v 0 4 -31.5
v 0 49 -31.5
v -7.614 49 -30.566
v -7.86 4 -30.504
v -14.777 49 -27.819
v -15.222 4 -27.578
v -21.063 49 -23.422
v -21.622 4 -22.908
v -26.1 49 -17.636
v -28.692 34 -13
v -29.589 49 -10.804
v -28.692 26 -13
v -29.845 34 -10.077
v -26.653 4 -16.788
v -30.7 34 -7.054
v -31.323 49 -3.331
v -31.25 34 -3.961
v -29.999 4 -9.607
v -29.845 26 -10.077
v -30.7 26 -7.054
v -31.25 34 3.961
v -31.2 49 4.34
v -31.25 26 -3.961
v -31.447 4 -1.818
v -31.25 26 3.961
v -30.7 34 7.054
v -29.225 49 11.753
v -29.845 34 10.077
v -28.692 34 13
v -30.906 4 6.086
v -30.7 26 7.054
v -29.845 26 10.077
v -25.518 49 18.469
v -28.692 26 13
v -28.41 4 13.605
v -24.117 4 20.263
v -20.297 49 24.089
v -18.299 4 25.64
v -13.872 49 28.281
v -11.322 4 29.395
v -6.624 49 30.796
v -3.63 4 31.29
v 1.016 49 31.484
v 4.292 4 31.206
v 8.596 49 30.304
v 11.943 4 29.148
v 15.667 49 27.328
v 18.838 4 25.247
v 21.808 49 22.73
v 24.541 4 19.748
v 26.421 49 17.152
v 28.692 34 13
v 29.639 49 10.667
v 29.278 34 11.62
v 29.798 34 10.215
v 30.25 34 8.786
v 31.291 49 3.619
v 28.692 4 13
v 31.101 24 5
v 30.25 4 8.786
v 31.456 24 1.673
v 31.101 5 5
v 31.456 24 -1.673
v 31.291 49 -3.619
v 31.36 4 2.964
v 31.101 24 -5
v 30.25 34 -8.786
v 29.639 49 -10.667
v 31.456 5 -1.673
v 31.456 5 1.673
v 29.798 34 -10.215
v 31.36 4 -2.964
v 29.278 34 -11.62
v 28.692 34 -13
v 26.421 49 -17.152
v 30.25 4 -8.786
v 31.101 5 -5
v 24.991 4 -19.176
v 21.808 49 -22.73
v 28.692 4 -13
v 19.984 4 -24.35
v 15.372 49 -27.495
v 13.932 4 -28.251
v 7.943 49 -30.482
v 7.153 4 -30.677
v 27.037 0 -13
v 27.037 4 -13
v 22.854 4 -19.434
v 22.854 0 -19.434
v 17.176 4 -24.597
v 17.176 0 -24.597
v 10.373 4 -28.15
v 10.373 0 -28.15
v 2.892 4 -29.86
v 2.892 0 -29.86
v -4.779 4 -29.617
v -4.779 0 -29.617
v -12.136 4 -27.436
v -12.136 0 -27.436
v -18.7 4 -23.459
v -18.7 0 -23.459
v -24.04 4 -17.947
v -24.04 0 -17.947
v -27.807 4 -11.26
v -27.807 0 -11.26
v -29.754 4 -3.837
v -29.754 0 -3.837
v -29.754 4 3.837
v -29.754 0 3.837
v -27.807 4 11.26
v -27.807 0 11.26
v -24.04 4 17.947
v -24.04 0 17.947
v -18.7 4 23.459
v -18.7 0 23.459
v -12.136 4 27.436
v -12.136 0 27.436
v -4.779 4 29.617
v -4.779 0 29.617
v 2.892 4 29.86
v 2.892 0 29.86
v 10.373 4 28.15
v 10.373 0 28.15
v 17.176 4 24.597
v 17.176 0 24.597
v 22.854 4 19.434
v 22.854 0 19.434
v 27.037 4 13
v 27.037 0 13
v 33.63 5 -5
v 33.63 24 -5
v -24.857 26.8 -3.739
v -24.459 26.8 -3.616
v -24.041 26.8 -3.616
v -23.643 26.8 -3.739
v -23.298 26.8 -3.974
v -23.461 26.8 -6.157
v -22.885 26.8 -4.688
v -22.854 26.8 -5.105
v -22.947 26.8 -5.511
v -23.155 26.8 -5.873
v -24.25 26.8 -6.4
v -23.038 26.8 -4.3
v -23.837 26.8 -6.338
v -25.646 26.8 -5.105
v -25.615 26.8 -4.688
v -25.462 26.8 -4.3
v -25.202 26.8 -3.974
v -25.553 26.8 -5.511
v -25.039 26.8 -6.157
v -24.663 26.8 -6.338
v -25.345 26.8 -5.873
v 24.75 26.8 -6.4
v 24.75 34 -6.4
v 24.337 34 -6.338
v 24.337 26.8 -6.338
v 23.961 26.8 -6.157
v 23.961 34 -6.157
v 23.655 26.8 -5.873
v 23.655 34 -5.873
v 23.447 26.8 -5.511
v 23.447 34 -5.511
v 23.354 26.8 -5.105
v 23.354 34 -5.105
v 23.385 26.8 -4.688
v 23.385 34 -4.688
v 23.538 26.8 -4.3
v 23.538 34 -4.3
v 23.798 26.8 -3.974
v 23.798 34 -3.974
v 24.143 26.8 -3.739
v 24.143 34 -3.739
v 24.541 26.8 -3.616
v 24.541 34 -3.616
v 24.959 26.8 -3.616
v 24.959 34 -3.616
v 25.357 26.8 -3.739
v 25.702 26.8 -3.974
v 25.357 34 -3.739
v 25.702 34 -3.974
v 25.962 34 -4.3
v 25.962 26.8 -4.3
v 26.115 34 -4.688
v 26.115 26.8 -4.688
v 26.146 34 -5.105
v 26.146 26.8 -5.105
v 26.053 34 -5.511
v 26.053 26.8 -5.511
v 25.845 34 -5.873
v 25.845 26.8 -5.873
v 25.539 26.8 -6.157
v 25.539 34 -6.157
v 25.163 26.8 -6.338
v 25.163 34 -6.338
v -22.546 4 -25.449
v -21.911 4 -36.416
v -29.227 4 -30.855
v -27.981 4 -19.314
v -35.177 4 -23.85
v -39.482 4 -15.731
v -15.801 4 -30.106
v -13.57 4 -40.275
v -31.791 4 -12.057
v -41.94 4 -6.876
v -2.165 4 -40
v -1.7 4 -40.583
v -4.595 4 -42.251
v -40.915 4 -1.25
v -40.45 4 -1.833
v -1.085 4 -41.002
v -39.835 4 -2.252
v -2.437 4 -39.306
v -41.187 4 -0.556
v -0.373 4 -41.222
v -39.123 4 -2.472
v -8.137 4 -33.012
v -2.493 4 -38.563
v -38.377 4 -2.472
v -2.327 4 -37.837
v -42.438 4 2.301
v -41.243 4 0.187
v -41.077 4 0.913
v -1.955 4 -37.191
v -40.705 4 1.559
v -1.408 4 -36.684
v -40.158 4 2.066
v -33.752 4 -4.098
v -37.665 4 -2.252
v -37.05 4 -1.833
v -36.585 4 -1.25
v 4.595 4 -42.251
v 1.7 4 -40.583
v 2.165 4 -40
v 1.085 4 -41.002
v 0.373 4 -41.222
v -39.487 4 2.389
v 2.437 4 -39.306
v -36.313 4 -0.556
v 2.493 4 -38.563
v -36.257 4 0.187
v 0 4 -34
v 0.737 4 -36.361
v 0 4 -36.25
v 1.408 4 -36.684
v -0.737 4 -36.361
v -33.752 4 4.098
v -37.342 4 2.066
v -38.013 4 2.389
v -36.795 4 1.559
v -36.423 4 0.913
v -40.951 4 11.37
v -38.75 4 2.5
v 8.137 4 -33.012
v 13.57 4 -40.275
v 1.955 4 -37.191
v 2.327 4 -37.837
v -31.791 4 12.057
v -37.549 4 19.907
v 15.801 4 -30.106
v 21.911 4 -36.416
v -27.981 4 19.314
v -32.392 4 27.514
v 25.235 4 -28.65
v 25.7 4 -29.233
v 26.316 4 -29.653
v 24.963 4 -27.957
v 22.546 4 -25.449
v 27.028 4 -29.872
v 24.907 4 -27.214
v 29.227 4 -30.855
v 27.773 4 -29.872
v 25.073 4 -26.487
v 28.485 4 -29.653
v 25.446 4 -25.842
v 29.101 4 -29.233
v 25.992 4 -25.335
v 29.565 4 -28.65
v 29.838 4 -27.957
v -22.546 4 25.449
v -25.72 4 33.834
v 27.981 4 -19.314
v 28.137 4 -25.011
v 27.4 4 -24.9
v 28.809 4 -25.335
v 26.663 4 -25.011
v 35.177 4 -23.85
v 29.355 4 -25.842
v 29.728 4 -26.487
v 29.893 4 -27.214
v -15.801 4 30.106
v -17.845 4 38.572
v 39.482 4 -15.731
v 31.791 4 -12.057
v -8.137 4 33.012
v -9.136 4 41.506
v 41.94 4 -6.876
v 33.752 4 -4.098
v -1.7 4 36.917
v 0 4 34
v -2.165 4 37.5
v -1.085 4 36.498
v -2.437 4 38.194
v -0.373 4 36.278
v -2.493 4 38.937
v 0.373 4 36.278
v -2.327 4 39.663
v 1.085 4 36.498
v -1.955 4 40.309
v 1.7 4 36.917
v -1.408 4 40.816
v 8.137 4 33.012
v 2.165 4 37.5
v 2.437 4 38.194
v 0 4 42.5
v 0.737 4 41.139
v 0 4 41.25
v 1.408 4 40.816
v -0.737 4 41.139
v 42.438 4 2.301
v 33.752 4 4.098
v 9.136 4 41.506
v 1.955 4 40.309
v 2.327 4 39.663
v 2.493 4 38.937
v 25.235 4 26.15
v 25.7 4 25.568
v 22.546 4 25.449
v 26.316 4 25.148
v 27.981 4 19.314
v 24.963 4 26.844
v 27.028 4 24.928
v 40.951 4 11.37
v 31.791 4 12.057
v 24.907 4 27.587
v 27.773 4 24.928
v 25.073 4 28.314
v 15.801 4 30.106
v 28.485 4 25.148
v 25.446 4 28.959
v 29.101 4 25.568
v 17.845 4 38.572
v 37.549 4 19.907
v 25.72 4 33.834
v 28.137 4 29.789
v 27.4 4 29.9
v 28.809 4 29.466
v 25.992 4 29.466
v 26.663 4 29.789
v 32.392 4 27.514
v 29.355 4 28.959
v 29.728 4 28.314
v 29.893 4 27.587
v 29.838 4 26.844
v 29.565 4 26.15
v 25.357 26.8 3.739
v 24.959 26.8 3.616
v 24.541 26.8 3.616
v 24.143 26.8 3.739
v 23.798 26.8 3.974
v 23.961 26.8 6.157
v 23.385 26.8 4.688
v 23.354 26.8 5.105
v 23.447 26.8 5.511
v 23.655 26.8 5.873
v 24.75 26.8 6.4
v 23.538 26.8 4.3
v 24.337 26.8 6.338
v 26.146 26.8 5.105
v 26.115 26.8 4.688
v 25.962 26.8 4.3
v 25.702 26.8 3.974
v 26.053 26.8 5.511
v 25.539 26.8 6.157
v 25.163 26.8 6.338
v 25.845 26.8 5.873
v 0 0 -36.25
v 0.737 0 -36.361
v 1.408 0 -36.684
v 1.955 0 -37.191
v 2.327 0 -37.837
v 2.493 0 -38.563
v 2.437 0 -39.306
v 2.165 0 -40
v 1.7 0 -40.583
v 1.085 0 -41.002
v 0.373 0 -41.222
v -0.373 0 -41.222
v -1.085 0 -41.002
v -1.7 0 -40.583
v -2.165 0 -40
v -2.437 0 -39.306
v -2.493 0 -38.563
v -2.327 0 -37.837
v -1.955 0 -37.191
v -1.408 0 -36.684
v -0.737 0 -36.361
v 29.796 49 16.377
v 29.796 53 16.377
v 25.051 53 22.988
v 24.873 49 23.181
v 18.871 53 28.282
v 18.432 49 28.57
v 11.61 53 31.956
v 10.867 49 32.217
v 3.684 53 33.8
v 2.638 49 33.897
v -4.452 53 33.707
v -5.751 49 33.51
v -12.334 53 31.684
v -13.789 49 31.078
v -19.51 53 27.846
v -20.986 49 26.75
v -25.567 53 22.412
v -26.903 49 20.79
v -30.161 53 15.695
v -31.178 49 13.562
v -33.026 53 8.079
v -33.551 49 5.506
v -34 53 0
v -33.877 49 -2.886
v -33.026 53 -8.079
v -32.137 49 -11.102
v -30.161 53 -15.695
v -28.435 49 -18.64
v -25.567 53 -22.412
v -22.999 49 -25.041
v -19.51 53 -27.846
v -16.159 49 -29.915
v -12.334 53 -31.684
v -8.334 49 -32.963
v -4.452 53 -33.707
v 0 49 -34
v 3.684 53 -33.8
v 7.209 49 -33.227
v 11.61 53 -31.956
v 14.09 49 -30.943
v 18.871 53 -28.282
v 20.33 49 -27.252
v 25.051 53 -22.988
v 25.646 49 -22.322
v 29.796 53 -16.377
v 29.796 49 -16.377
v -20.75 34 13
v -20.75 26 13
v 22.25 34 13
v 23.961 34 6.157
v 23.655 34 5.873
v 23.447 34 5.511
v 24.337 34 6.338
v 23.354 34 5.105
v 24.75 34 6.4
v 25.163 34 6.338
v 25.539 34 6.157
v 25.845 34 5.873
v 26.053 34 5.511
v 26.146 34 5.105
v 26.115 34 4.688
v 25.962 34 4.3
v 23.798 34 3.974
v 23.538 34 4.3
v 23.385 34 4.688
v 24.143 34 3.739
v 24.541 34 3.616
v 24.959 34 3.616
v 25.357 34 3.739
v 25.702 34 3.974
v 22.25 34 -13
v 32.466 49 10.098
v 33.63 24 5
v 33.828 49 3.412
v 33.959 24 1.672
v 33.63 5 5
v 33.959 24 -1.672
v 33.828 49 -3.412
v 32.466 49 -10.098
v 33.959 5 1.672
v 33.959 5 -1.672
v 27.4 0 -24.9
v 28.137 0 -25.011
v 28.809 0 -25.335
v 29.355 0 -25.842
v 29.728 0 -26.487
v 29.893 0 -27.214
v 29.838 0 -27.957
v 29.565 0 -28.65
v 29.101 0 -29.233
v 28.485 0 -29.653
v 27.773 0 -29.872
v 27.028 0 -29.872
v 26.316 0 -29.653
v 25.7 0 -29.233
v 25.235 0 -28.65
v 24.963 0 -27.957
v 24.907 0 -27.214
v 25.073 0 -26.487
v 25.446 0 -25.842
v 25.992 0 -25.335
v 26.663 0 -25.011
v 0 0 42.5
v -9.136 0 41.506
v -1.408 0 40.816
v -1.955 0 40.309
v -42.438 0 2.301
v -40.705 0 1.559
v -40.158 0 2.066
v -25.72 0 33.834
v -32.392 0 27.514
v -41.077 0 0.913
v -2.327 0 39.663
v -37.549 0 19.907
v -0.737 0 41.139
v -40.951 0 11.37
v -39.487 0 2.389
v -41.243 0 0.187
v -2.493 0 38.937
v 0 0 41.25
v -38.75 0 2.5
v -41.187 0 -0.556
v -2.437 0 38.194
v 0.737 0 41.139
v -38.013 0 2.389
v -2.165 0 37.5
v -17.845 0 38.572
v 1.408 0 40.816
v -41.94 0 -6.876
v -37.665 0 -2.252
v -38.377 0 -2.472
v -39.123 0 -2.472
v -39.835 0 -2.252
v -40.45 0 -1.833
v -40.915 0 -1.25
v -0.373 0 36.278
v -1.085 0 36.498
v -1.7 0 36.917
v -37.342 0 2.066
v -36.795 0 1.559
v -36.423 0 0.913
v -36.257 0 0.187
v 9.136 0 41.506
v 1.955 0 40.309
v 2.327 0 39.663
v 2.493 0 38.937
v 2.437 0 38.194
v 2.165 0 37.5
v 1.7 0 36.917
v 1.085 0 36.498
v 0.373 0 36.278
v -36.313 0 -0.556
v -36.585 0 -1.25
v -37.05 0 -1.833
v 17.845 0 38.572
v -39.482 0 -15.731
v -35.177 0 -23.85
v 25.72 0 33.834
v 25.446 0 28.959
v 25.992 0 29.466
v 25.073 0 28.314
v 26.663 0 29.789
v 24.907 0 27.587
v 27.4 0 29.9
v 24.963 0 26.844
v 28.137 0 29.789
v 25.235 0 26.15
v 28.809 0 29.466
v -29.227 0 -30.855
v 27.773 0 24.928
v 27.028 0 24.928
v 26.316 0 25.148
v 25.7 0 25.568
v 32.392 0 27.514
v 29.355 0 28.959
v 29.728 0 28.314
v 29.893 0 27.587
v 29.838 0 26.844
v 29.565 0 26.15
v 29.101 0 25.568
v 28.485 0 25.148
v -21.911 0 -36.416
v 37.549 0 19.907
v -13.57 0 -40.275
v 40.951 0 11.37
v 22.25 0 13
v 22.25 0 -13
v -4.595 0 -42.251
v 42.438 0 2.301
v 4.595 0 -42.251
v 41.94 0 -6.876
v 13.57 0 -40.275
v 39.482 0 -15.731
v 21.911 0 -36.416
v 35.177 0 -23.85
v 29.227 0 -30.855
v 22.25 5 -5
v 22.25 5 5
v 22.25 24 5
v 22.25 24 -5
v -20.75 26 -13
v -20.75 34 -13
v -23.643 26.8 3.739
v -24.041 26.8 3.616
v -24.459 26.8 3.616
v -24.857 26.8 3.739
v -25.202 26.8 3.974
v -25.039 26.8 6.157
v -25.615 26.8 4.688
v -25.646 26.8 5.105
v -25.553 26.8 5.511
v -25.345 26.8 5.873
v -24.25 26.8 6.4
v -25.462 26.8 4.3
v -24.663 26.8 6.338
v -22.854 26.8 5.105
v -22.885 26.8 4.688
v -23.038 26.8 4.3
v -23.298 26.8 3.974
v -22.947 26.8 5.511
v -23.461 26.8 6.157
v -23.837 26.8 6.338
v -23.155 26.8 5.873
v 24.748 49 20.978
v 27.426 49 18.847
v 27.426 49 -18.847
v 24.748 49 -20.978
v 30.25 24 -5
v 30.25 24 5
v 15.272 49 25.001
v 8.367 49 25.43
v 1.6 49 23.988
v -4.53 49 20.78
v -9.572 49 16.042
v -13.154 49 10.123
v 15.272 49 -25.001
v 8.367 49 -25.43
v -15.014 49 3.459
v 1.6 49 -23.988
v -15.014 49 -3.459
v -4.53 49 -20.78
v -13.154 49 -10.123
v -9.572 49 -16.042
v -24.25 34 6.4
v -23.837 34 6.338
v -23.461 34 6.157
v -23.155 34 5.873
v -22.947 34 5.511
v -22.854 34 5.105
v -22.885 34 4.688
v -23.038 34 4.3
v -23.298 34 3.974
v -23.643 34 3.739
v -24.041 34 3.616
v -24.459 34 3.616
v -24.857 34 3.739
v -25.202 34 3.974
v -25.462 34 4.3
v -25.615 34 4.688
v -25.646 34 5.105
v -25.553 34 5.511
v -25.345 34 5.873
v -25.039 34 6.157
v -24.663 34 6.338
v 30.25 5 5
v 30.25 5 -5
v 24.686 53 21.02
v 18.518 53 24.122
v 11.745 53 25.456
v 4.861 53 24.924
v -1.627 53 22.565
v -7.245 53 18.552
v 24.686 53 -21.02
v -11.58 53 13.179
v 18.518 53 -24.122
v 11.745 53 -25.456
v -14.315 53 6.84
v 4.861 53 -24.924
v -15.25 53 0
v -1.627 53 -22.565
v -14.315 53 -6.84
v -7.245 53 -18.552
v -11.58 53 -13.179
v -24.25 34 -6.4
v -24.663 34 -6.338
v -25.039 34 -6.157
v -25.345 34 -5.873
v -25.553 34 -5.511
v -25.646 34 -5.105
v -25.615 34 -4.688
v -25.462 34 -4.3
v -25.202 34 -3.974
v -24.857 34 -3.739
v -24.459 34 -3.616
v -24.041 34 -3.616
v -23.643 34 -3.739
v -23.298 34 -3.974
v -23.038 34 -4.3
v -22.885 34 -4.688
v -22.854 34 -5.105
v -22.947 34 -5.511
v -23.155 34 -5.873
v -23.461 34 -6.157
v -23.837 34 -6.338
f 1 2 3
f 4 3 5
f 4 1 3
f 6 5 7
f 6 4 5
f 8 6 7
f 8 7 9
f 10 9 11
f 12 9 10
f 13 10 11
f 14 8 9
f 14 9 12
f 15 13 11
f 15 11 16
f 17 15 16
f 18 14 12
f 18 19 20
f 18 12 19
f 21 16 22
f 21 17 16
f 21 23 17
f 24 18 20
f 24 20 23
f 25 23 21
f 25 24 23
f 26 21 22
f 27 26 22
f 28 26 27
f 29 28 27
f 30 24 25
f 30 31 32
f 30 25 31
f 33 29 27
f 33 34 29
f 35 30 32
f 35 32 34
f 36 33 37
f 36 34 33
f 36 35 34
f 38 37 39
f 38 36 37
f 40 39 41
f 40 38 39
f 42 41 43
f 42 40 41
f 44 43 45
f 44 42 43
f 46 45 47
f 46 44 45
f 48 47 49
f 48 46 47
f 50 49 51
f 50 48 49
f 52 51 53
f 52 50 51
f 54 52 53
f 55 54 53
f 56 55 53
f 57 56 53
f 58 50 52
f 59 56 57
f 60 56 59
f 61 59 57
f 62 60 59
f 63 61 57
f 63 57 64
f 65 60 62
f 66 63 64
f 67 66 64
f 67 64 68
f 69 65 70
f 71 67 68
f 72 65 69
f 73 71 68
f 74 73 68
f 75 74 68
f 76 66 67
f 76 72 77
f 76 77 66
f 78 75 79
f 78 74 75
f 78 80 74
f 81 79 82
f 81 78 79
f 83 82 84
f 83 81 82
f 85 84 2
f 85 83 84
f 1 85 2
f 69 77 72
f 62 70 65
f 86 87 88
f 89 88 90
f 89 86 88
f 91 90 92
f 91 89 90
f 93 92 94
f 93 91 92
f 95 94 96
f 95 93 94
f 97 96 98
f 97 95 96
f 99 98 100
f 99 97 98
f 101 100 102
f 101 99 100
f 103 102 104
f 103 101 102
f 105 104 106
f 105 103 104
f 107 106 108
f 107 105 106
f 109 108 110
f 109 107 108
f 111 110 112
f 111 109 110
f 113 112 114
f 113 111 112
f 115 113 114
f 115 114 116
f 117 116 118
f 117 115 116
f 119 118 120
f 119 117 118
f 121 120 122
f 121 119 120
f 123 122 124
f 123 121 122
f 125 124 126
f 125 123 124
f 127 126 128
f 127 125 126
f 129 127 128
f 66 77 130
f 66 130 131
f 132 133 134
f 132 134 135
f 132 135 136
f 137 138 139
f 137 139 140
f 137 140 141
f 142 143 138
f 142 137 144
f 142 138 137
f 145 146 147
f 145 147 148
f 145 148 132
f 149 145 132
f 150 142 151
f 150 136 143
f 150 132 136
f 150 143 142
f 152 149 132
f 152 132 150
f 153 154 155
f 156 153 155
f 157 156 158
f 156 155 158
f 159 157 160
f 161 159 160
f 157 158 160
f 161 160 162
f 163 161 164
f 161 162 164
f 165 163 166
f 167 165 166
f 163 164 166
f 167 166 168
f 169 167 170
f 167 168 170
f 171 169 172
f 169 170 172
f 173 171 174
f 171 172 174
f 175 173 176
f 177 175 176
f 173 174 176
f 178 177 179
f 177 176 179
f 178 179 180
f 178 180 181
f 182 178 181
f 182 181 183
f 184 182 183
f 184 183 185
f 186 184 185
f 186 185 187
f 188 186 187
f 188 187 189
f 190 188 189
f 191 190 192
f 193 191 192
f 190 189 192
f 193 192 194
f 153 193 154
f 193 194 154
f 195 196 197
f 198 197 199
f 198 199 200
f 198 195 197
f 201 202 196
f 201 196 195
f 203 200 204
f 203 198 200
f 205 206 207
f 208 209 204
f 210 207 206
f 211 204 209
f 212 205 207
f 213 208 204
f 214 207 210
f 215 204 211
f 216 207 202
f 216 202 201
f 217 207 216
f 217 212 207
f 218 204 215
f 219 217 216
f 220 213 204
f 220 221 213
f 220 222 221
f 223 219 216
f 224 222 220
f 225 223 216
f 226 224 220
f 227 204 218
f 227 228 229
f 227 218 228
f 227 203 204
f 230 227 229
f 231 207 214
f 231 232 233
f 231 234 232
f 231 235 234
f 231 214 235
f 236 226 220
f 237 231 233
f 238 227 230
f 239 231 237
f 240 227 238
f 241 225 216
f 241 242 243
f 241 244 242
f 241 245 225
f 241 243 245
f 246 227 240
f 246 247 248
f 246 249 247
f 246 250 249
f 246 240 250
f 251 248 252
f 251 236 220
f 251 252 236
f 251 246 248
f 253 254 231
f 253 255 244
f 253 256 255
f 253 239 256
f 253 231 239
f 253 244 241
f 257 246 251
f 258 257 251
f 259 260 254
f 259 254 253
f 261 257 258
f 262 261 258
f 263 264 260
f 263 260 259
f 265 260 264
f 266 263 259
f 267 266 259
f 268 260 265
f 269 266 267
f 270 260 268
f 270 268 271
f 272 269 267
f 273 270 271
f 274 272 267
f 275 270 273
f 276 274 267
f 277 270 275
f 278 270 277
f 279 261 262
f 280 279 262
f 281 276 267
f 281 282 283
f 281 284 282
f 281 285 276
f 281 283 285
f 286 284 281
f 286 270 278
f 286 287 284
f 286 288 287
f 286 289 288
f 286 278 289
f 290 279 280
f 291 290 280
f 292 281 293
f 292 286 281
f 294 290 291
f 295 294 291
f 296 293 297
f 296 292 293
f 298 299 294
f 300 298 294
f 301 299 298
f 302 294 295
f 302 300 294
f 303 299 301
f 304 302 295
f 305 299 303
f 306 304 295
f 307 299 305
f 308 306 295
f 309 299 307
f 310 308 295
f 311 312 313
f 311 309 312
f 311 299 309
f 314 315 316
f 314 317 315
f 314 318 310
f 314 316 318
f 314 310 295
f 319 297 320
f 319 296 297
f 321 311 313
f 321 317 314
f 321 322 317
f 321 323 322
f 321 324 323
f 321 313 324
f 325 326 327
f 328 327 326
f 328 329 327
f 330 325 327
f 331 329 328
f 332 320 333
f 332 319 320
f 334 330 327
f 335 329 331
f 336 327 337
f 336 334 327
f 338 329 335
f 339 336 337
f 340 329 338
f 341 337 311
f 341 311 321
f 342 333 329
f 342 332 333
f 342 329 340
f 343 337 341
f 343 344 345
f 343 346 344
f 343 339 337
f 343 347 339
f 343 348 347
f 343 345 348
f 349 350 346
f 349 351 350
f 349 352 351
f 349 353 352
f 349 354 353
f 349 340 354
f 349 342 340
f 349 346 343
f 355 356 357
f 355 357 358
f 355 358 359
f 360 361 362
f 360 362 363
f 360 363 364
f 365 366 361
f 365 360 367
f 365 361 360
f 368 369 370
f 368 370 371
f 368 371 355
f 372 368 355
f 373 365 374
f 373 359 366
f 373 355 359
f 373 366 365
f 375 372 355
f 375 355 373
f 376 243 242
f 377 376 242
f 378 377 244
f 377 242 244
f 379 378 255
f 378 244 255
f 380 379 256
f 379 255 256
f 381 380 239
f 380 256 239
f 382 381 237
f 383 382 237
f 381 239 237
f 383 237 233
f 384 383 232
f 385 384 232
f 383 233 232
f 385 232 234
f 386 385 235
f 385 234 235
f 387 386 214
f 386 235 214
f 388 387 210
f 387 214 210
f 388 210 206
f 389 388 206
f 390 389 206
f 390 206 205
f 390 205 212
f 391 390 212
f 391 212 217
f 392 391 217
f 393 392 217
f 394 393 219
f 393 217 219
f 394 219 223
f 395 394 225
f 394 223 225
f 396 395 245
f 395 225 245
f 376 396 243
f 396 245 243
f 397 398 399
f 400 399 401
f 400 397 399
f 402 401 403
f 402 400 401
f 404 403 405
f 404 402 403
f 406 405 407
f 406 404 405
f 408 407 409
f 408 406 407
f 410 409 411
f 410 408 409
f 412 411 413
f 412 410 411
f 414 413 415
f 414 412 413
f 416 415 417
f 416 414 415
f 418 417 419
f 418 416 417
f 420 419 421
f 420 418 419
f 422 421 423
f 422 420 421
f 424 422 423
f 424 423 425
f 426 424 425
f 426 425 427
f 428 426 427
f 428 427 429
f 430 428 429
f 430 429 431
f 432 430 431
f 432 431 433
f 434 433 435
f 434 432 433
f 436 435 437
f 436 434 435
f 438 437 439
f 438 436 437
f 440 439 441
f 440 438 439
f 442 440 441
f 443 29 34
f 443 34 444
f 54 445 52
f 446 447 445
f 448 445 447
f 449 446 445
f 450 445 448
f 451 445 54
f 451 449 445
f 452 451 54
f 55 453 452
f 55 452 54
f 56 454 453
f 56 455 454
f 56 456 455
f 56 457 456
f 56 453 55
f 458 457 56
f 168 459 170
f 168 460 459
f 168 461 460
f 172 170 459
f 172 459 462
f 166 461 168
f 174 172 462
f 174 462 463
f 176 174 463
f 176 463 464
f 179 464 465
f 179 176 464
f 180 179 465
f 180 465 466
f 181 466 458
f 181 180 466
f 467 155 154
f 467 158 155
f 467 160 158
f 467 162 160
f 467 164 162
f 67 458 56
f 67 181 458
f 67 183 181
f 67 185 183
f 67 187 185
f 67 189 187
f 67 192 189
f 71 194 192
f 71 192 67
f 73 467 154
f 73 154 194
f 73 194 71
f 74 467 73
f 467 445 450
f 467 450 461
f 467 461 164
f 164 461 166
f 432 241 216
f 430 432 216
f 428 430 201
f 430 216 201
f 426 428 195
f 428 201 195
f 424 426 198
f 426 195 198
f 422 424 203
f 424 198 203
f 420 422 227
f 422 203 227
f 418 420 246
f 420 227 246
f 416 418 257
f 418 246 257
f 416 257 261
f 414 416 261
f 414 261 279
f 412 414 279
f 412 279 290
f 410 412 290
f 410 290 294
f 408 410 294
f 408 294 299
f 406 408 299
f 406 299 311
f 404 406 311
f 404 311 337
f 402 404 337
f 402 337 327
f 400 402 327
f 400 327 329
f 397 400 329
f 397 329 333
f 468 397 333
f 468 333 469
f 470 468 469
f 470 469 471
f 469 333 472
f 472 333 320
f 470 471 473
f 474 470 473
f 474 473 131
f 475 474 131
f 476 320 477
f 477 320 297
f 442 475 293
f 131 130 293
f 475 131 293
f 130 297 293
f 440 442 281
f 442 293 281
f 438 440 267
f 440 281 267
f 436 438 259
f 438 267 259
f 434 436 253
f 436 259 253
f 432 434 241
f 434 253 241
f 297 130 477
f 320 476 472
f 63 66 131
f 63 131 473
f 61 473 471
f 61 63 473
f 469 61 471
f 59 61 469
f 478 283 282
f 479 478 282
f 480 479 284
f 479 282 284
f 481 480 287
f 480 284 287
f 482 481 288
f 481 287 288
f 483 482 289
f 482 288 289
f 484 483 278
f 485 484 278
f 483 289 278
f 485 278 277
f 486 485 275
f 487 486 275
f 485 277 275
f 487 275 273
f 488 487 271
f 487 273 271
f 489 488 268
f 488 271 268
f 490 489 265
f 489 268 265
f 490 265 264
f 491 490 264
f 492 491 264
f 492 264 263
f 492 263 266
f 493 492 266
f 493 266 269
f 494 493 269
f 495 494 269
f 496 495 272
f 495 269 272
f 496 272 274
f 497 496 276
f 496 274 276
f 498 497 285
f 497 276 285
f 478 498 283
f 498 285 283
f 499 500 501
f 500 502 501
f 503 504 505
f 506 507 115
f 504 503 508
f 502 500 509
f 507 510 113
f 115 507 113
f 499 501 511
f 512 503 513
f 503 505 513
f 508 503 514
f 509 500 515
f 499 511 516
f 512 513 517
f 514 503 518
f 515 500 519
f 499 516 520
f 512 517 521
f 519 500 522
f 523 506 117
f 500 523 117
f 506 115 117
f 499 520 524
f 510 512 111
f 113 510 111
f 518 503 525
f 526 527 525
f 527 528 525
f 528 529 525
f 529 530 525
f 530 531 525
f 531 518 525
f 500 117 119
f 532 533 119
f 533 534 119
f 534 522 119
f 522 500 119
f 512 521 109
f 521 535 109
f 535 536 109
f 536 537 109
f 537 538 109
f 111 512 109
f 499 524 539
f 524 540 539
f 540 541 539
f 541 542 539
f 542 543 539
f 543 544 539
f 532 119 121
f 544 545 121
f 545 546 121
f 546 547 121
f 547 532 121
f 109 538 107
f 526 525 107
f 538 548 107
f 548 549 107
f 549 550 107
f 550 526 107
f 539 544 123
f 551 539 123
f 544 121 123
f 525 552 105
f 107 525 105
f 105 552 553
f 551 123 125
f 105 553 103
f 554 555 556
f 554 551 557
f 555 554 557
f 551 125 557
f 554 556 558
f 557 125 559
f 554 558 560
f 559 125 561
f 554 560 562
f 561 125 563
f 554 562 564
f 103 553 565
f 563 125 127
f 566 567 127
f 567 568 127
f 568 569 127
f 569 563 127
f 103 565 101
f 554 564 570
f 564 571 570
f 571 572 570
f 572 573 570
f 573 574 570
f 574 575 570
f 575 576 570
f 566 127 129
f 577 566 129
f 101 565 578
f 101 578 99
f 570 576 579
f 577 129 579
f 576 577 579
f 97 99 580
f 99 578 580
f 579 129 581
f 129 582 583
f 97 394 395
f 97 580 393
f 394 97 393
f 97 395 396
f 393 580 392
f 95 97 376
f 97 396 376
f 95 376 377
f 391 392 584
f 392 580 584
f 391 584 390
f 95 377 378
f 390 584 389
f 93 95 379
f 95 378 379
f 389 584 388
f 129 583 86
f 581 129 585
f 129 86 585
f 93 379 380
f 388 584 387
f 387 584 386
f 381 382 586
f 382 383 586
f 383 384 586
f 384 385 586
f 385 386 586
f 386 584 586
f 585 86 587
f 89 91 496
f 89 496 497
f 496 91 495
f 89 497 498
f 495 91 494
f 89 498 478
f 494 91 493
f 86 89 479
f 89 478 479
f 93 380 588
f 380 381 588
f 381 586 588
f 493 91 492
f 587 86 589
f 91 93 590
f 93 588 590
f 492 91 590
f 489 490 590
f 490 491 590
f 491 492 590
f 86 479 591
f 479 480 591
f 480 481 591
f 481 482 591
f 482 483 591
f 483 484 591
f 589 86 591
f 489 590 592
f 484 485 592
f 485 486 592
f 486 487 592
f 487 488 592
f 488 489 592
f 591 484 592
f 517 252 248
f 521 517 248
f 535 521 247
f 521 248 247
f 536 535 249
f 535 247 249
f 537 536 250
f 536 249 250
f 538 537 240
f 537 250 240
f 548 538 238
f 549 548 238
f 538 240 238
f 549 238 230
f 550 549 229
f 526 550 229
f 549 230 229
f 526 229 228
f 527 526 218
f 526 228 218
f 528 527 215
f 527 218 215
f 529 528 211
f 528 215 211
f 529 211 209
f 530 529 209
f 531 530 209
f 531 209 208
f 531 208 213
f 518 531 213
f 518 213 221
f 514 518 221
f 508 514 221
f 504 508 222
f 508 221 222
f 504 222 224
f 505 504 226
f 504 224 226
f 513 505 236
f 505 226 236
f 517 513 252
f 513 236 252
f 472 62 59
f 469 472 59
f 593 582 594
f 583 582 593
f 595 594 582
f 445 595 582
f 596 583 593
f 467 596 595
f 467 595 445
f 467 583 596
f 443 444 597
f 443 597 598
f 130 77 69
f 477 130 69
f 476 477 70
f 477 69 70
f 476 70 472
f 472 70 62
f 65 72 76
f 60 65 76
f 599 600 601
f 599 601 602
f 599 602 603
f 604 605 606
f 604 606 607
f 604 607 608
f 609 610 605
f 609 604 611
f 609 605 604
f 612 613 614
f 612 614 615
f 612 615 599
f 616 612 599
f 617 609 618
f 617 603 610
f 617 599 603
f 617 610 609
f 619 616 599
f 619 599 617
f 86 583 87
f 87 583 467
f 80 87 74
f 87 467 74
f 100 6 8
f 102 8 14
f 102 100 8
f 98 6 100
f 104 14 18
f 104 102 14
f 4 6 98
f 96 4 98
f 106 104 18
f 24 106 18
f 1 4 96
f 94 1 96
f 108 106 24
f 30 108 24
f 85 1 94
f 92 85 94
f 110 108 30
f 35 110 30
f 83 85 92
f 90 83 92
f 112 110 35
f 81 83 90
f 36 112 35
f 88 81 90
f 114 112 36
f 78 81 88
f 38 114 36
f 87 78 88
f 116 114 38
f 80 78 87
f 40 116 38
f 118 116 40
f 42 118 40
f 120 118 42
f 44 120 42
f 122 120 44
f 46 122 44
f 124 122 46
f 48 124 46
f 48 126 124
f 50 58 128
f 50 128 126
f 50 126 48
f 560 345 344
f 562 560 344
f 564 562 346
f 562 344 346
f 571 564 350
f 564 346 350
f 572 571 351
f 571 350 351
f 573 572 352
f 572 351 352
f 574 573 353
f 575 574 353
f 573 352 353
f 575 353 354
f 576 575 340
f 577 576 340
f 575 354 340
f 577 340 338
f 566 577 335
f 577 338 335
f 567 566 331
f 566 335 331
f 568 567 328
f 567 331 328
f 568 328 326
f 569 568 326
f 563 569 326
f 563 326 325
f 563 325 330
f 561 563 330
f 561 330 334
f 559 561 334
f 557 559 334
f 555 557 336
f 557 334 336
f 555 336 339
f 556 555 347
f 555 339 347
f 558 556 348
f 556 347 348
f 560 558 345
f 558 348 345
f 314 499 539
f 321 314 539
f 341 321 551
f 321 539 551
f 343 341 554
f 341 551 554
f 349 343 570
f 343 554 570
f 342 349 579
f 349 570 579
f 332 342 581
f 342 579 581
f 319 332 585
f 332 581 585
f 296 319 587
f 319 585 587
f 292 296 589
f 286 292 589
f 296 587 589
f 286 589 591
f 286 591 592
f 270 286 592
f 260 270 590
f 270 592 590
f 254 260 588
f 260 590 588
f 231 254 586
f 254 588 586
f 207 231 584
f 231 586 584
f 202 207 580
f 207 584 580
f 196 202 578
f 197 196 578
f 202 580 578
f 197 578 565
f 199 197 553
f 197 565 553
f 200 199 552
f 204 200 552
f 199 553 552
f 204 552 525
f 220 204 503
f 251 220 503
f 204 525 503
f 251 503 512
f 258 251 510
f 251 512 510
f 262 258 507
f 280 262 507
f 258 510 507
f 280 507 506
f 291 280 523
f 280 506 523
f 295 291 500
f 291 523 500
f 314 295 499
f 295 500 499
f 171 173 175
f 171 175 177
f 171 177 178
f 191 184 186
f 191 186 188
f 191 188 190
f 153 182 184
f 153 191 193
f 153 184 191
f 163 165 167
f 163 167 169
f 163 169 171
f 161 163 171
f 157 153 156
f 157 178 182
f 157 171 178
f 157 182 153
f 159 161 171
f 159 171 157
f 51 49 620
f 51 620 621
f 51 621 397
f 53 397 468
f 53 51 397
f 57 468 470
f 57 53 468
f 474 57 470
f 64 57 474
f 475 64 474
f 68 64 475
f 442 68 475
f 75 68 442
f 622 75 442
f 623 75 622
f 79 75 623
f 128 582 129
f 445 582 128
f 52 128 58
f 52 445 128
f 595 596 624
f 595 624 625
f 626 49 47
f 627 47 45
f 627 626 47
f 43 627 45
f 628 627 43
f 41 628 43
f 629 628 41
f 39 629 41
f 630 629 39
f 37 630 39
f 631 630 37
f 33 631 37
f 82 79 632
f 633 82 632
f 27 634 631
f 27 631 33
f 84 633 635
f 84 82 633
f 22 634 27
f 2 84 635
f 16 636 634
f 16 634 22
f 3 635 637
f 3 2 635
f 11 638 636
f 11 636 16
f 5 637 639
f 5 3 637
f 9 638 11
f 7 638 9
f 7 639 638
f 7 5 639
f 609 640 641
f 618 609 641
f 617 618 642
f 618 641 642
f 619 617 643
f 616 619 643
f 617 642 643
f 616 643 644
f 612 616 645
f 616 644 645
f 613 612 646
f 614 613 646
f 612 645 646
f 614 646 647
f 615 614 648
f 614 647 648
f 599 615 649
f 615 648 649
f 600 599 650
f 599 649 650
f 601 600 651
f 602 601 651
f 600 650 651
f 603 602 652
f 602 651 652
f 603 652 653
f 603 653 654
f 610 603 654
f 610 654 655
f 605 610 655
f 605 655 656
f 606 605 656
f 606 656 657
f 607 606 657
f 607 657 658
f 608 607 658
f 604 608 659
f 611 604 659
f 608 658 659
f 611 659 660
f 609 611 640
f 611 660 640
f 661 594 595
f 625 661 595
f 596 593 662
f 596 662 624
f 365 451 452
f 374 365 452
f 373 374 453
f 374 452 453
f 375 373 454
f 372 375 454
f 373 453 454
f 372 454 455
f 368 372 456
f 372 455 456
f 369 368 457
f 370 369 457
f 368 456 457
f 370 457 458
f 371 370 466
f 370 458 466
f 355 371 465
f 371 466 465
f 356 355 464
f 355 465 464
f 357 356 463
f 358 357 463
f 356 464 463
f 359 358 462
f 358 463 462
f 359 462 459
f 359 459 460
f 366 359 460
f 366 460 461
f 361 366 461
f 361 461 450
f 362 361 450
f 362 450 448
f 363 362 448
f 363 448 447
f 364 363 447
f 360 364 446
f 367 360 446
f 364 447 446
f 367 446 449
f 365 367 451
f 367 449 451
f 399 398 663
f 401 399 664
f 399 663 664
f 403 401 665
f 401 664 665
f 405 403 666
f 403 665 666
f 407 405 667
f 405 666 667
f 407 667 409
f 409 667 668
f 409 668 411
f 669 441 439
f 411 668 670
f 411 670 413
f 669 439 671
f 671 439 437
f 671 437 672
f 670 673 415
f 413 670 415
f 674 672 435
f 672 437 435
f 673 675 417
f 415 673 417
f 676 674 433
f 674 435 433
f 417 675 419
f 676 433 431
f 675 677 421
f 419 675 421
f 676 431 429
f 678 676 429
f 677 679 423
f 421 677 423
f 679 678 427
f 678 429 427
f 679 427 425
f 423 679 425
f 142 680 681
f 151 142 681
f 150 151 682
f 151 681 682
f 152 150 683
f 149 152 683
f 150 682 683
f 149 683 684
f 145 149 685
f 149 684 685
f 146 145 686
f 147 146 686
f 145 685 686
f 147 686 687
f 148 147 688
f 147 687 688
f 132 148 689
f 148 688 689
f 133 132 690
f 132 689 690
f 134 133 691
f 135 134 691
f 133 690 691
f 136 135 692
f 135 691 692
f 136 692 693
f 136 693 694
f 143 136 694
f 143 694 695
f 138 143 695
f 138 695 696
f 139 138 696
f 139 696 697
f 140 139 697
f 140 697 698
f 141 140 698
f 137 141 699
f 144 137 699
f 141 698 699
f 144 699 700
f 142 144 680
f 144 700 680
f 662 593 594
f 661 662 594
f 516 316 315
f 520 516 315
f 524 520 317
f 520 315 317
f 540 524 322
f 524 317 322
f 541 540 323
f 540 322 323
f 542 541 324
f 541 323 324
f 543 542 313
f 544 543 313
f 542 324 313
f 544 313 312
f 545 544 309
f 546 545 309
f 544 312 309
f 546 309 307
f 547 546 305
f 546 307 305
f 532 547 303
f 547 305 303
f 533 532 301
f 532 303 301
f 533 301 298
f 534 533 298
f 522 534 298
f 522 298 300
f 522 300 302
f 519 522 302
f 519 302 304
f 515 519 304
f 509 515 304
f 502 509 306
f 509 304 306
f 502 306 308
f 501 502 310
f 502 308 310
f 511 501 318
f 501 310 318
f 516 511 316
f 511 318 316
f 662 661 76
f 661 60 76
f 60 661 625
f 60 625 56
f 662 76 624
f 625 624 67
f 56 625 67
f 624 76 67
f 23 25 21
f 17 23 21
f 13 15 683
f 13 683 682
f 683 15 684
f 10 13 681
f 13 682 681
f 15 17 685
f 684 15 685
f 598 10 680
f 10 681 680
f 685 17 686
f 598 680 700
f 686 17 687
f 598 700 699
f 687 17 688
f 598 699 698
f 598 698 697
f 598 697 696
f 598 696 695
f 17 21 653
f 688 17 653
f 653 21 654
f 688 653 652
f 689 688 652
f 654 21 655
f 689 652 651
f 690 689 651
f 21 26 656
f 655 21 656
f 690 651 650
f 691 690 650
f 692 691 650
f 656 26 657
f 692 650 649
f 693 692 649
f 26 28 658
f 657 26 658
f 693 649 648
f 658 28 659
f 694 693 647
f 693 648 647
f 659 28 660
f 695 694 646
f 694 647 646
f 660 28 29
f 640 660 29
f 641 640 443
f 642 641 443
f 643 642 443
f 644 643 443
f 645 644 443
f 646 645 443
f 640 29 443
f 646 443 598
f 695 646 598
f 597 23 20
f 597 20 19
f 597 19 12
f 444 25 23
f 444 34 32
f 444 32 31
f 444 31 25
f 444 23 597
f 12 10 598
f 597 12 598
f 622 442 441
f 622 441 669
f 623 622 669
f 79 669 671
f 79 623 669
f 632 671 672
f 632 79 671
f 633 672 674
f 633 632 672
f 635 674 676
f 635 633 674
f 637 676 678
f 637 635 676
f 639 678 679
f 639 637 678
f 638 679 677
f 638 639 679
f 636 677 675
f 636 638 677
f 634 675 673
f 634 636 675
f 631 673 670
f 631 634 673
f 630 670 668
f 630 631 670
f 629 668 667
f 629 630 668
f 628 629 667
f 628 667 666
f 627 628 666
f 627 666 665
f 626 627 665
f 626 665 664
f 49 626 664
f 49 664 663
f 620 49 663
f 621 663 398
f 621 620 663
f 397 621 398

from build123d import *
from build123d.topology import SkipClean

# Parameters (mm, degrees)
SKETCH1_R           = 42.5
SKETCH1_R_2         = 30
BOSS_EXTRUDE1_DEPTH = 4
SKETCH2_R           = 34
SKETCH2_R_2         = 31.5
BOSS_EXTRUDE2_DEPTH = 45
SKETCH3_W           = 8
SKETCH3_H           = 34
SKETCH3_W_2         = 10.5
SKETCH3_H_2         = 8
BOSS_EXTRUDE3_DEPTH = 13
SKETCH4_W           = 10
SKETCH4_H           = 19
CUT_EXTRUDE1_DEPTH  = 92.650490997
SKETCH6_R           = 1.4
CUT_EXTRUDE3_DEPTH  = 7.2
SKETCH8_R           = 2.5
CUT_EXTRUDE4_DEPTH  = 4
BOSS_EXTRUDE4_DEPTH = 4


with BuildPart() as part:
    # Sketch1 → Boss-Extrude1 (new body)
    with BuildSketch(Plane(origin=(0, 0, 0), x_dir=(1, 0, 0), z_dir=(0, 1, 0))):
        with Locations(Location((0, 0, 0), (0, 0, 270))):
            Circle(SKETCH1_R)
        with Locations(Location((0, 0, 0), (0, 0, 270))):
            Circle(SKETCH1_R_2, mode=Mode.SUBTRACT)
    extrude(amount=BOSS_EXTRUDE1_DEPTH)

    # Sketch2 → Boss-Extrude2 (add)
    with BuildSketch(Plane(origin=(0, 4, 0), x_dir=(1, 0, 0), z_dir=(0, 1, 0))):
        with Locations(Location((0, 0, 0), (0, 0, 90))):
            Circle(SKETCH2_R)
        with Locations(Location((0, 0, 0), (0, 0, 90))):
            Circle(SKETCH2_R_2, mode=Mode.SUBTRACT)
    extrude(amount=BOSS_EXTRUDE2_DEPTH)

    # Sketch3 → Boss-Extrude3 (add, symmetric)
    with BuildSketch(Plane.XY):
        with Locations((26.25, 17)):
            Rectangle(SKETCH3_W, SKETCH3_H)
        with Locations((-26, 30)):
            Rectangle(SKETCH3_W_2, SKETCH3_H_2)
    extrude(amount=BOSS_EXTRUDE3_DEPTH, both=True)

    # Sketch4 → Cut-Extrude1 (cut, through all)
    with BuildSketch(Plane.ZY.offset(-22.25)):
        with Locations((0, 14.5)):
            Rectangle(SKETCH4_W, SKETCH4_H)
    extrude(amount=-CUT_EXTRUDE1_DEPTH, mode=Mode.SUBTRACT)

    # Sketch6 → Cut-Extrude3 (cut)
    with BuildSketch(Plane(origin=(0, 34, 0), x_dir=(1, 0, 0), z_dir=(0, 1, 0))):
        with Locations(Location((-24.25, -5, 0), (0, 0, 270))):
            Circle(SKETCH6_R)
        with Locations(Location((24.75, -5, 0), (0, 0, 270))):
            Circle(SKETCH6_R)
        with Locations(Location((24.75, 5, 0), (0, 0, 90))):
            Circle(SKETCH6_R)
        with Locations(Location((-24.25, 5, 0), (0, 0, 90))):
            Circle(SKETCH6_R)
    extrude(amount=-CUT_EXTRUDE3_DEPTH, mode=Mode.SUBTRACT)

    # Sketch8 → Cut-Extrude4 (cut)
    with BuildSketch(Plane(origin=(0, 4, 0), x_dir=(1, 0, 0), z_dir=(0, 1, 0))):
        with Locations(Location((-38.75, 0, 0), (0, 0, 270))):
            Circle(SKETCH8_R)
        with Locations(Location((0, 38.75, 0), (0, 0, 270))):
            Circle(SKETCH8_R)
        with Locations(Location((0, -38.75, 0), (0, 0, 270))):
            Circle(SKETCH8_R)
        with Locations(Location((27.400387771, -27.400387771, 0), (0, 0, 270))):
            Circle(SKETCH8_R)
        with Locations(Location((27.400387771, 27.400387771, 0), (0, 0, 270))):
            Circle(SKETCH8_R)
    extrude(amount=-CUT_EXTRUDE4_DEPTH, mode=Mode.SUBTRACT)

    # Sketch9 → Boss-Extrude4 (add)
    with SkipClean():  # the faces are left unmerged after this step: merging them gives an invalid solid
        with BuildSketch(Plane(origin=(0, 49, 0), x_dir=(1, 0, 0), z_dir=(0, 1, 0))):
            with BuildLine():
                ThreePointArc((29.795731707, 16.377251663), (-15.25, 0), (29.795731707, -16.377251663))
                ThreePointArc((29.795731707, -16.377251663), (-34, 0), (29.795731707, 16.377251663))
            make_face()
        extrude(amount=BOSS_EXTRUDE4_DEPTH)


solid = part.part
